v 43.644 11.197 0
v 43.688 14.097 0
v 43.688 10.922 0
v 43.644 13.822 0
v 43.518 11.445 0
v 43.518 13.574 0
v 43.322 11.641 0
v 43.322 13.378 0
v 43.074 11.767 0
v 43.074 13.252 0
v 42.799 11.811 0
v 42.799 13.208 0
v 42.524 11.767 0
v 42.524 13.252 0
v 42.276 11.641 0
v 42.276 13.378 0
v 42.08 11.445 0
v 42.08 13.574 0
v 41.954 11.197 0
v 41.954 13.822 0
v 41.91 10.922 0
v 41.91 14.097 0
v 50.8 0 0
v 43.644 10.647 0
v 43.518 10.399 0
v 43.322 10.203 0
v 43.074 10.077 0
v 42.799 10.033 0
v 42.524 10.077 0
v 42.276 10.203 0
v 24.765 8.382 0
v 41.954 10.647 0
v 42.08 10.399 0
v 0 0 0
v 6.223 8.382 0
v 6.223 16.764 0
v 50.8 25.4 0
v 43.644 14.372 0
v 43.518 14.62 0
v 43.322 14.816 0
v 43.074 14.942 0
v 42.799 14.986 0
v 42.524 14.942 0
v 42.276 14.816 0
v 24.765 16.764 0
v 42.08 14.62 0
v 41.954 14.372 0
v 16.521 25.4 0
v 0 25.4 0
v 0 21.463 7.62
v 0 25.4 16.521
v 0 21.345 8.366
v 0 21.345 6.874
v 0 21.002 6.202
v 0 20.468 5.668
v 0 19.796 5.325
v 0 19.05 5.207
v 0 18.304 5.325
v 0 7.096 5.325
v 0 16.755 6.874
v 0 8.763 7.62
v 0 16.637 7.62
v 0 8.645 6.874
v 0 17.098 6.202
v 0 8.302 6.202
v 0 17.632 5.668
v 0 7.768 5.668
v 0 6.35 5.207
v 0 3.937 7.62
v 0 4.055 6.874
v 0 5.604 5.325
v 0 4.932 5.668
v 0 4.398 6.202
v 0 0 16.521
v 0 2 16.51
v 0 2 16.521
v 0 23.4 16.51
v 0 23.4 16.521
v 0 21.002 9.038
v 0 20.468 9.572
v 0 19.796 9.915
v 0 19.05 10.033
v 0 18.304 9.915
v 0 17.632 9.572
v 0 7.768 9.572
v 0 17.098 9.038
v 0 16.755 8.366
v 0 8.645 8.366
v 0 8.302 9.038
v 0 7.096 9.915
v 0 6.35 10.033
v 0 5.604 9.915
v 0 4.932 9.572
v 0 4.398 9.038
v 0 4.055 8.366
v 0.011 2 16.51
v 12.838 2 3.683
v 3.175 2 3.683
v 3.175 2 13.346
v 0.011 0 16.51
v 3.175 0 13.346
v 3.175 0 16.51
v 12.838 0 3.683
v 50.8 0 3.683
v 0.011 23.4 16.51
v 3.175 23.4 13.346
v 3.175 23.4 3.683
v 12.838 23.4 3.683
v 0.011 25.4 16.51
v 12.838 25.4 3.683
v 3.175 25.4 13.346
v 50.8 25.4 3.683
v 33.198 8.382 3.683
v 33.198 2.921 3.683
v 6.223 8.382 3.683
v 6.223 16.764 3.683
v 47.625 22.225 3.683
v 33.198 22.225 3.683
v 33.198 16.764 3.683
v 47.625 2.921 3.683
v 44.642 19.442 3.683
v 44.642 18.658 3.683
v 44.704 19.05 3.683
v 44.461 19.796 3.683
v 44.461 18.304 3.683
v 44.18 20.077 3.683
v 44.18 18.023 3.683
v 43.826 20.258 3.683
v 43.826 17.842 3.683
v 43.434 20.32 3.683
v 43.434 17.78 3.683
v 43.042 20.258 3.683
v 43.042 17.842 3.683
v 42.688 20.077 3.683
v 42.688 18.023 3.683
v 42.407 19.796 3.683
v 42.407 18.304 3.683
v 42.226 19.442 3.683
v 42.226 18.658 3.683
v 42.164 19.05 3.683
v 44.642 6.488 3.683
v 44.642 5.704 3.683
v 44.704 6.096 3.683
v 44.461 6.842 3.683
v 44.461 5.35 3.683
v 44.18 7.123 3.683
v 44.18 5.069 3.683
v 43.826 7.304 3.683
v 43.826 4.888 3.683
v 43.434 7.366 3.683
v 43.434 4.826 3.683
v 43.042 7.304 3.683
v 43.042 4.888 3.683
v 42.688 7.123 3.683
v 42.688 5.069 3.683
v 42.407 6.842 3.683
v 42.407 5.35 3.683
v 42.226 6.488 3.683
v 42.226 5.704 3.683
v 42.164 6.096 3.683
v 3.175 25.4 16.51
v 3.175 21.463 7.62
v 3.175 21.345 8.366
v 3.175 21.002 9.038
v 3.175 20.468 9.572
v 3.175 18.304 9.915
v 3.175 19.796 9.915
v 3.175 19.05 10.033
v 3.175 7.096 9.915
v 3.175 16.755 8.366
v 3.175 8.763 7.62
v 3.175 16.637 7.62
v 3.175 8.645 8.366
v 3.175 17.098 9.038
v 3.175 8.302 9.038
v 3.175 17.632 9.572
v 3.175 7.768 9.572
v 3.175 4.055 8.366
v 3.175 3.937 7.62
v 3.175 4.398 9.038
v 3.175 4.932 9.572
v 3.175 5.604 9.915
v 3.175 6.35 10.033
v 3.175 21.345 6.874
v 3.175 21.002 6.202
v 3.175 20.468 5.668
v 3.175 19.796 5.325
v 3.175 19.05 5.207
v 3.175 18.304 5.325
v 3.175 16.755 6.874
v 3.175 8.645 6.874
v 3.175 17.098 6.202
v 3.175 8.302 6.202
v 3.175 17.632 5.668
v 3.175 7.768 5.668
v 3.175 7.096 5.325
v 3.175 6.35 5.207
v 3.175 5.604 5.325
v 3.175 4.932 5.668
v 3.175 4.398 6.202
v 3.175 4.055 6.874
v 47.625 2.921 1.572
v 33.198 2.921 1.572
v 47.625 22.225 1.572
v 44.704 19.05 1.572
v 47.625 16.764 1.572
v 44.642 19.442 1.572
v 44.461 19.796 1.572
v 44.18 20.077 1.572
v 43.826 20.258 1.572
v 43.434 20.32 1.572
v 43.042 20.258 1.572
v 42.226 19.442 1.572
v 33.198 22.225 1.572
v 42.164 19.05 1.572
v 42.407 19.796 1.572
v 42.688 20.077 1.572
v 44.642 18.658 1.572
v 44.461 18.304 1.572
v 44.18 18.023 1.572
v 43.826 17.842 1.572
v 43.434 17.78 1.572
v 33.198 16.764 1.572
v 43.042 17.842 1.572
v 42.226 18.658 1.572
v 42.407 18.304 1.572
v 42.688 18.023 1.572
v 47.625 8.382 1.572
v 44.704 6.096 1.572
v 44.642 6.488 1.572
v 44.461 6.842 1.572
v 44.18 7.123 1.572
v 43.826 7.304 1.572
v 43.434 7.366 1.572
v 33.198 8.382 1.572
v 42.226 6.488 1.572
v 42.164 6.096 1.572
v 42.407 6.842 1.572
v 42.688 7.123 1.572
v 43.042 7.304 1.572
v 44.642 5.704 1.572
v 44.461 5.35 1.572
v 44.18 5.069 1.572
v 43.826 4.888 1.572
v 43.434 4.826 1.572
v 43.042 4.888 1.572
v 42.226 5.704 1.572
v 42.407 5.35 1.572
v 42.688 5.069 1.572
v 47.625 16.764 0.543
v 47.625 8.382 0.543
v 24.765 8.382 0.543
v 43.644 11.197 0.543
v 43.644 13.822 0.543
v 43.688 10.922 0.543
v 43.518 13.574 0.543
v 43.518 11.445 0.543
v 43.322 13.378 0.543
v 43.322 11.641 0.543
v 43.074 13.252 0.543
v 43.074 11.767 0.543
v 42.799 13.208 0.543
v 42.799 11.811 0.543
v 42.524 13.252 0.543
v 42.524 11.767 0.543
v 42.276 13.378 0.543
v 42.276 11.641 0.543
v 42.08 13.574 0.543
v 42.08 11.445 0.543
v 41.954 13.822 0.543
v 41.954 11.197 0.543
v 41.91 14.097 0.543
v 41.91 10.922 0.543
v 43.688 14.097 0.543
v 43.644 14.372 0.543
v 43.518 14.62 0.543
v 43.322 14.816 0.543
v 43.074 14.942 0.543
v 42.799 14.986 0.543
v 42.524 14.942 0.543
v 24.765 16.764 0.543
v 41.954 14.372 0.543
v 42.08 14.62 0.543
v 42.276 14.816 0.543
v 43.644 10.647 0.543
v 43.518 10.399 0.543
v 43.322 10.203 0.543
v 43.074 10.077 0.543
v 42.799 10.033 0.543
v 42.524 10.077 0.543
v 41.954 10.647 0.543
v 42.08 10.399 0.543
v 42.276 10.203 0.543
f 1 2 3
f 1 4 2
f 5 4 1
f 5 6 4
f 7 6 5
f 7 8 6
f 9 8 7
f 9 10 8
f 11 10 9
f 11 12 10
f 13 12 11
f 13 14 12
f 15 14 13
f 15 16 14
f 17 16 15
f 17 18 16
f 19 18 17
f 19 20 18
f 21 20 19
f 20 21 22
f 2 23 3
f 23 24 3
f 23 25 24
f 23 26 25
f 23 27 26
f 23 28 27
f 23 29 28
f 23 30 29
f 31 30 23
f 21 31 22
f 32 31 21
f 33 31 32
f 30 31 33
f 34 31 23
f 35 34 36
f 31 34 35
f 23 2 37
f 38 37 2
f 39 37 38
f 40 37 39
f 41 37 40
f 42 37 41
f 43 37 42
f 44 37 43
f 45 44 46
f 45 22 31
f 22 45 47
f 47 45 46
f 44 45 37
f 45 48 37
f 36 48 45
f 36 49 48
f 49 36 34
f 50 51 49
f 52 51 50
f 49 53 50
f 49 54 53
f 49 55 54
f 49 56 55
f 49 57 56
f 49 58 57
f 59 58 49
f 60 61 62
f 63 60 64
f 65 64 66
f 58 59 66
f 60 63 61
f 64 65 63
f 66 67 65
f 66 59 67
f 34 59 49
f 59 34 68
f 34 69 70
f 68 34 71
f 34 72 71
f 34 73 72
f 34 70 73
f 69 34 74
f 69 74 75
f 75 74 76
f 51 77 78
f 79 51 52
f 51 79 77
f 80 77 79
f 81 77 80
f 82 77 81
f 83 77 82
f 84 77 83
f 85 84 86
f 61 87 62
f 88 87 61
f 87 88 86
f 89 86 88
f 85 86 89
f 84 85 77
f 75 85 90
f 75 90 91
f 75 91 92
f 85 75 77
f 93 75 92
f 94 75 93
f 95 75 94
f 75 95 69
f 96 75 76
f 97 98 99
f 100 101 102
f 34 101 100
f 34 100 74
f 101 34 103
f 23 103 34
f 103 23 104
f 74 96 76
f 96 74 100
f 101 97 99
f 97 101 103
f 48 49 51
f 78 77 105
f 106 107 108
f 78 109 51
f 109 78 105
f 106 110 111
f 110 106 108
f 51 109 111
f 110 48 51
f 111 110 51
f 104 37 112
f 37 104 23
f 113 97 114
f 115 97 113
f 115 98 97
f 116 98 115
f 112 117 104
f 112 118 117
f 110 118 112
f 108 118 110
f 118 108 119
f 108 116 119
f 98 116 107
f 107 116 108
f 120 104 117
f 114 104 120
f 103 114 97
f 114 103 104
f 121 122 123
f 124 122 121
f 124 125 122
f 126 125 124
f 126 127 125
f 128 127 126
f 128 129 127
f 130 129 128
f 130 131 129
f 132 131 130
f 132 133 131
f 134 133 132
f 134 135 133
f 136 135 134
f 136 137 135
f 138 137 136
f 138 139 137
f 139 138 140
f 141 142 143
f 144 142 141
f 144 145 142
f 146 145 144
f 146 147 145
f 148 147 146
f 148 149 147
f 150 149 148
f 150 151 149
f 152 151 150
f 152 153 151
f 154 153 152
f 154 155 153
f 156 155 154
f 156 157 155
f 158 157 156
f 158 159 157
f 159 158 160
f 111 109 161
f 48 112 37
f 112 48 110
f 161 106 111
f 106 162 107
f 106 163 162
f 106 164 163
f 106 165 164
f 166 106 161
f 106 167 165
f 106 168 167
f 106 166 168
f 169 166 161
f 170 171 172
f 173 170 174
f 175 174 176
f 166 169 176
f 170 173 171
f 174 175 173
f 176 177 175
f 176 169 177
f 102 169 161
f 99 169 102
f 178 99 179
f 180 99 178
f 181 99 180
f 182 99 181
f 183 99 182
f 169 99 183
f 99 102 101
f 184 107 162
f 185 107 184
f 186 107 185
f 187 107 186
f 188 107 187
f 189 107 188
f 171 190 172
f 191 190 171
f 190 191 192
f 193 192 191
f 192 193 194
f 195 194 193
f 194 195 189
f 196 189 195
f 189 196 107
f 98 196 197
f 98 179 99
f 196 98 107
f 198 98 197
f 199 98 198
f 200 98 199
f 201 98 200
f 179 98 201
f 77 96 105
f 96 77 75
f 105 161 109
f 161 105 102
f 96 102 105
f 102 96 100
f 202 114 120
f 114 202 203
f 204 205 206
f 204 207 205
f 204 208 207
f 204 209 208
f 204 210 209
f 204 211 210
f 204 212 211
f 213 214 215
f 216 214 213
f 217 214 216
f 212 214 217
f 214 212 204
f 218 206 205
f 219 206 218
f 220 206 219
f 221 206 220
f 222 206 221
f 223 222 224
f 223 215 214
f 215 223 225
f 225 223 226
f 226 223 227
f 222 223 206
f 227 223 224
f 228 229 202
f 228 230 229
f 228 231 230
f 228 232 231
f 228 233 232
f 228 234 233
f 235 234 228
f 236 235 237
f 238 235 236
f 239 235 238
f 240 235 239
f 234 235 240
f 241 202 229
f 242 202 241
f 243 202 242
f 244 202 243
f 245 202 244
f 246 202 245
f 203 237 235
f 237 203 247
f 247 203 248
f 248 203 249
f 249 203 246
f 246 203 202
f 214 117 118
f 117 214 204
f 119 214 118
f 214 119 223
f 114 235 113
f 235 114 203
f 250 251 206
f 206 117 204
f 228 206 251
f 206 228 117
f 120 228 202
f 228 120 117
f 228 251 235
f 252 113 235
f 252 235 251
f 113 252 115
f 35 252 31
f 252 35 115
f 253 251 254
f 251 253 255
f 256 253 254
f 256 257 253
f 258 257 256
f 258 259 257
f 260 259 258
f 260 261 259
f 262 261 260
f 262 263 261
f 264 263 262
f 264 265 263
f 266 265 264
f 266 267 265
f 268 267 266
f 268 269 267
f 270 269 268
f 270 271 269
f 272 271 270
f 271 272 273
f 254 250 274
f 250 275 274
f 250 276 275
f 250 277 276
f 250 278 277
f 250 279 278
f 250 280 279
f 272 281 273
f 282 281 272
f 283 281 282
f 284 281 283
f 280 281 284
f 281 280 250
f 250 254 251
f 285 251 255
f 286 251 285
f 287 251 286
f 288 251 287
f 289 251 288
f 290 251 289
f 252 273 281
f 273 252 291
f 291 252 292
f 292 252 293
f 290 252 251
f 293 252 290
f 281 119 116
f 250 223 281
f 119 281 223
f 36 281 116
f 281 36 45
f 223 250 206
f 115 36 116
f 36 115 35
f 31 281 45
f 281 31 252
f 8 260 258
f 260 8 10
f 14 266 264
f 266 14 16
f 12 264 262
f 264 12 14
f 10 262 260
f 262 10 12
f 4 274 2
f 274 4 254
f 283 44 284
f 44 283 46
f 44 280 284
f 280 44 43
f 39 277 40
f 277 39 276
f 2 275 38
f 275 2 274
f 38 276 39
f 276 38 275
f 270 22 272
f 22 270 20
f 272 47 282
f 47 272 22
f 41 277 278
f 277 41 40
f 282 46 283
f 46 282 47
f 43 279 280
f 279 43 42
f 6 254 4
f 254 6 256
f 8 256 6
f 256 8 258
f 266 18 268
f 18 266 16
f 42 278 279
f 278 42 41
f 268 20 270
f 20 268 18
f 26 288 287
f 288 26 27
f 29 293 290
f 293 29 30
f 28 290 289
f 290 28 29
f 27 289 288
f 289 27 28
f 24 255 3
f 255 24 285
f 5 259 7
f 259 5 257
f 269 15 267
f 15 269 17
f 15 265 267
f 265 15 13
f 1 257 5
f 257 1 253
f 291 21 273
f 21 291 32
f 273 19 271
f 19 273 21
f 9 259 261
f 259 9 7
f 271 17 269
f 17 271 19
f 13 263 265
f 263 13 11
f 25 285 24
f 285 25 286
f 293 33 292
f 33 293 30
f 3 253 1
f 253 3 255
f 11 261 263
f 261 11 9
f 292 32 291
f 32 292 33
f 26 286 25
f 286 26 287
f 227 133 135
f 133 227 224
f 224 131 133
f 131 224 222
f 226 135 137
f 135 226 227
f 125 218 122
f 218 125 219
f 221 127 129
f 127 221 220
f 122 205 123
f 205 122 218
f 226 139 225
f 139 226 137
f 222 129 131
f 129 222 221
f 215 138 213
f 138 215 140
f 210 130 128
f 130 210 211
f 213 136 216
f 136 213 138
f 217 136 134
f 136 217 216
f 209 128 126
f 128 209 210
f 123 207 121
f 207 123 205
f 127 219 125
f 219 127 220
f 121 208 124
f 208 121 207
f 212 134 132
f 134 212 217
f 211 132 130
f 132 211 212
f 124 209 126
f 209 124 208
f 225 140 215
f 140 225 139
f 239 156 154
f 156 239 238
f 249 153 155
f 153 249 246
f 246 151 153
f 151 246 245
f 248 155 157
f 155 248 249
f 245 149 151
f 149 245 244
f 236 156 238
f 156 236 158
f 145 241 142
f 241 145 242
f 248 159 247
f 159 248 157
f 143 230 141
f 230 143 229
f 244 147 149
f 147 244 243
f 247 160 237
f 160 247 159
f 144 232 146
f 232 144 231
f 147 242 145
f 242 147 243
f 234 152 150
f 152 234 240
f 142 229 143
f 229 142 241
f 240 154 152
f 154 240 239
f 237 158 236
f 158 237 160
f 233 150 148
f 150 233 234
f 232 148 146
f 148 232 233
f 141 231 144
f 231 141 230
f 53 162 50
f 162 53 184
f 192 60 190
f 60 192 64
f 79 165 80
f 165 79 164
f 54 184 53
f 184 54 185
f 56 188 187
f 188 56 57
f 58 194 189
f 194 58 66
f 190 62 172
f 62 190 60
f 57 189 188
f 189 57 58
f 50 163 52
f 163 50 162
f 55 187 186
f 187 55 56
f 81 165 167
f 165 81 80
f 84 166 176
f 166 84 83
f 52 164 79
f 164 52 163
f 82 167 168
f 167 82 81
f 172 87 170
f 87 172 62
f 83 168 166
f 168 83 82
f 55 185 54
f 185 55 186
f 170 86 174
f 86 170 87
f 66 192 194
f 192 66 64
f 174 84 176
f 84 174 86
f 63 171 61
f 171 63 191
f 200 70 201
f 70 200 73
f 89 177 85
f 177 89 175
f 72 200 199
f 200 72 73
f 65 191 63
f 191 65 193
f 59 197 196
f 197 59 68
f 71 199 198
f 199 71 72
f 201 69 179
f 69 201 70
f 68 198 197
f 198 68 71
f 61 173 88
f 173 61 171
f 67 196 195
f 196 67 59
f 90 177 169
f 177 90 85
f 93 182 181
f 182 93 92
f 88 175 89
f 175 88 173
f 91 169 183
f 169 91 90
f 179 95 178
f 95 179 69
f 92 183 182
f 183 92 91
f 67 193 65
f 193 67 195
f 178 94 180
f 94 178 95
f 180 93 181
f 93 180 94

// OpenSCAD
width=inch(1);
thickness=inch(0.125);

extra_thick=inch(0.020);
//extra_thick=inch(0);
length=inch(2);
diagthick=2;

holedia = inch(0.190);

function inch(a) = a*25.4;

module mytriangle()
{
    intersection() {
	cube([width, diagthick, width]);
	translate([-width+6, 0, 0]) {
	    rotate([0, 45, 0]) {
		cube([width, diagthick, width]);
	    }
	}    
    }
}

module bracket() {
    union(){
	cube([inch(2),   inch(1), thickness+extra_thick  ]);   // bottom - where sensor goes

/*	translate([inch(1.2), 0, 0]) {    // extra around sensor
	    cube([inch(0.8), inch(1), thickness+extra_thick]);
	}
*/
	
	cube([thickness, inch(1), inch(0.65)]);	// vertical mounting tail
    
        mytriangle();
	translate([0, width-diagthick, 0]) {
	    mytriangle();
	}

    }
}

// positive model of wcp hall-effect sensor
module wcp971() {

    difference() {
	union(){
	    cube([inch(.760), inch(.568), inch(.0635)+extra_thick]);
	    translate([ inch((.760-.330)/2), 0, 0]) {
		cube([ inch(.330), inch(1.500), inch(.104)+extra_thick]);
	    }
	    translate([ inch((.760-.330)/2), inch(0.9), 0]) {
		cube([ inch(.330), inch(0.730), inch(.2)]);
	    }
	    
	    translate([inch((.760-.12)/2 ), inch(.190), -1]) {
		cylinder(h=8, d=inch(.07),  $fn=20);
	    }
	    translate([inch(.760-(.750-.12)/2 ), inch(.190), -1]) {
		cylinder(h=8, d=inch(.07),  $fn=20);
	    }
	    
	}

	translate([inch((.760-.510)/2 ), inch(.165), -1]) {
	    cylinder(h=8,d=inch(.100),  $fn=20);
	}

	translate([inch(.760 - (.760-.510)/2 ), inch(.165), -1]) {
	    cylinder(h=8,d=inch(.100),  $fn=20);
	}
    }
}

// put it all together
union(){
    difference () {
	bracket();

	translate([inch(1.875),inch(.875), thickness+0.010+extra_thick]) {
	    rotate([0,180,90]) {
		wcp971();
	    }
	}

	// bottom-side holes 
/*
	translate([15,20,0]) {
		cylinder(h=6,d=6);
	}
*/

// holes in vertical tail for mounting
	translate([-1, inch(0.75),inch(0.3) ]) {
	    rotate([0,90,0]) {
		cylinder(h=8,d=holedia,  $fn=20);
	    }
        }
	translate([-1, inch(0.25), inch(0.3) ]) {
	    rotate([0,90,0]) {
		cylinder(h=8,d=holedia, $fn=20);
	    }
        }

	translate([-1, inch(0.75),inch(0.8) ]) {
	    rotate([0,90,0]) {
		cylinder(h=8,d=holedia,  $fn=20);
	    }
        }
	translate([-1, inch(0.25), inch(0.8) ]) {
	    rotate([0,90,0]) {
		cylinder(h=8,d=holedia,  $fn=20);
	    }
        }
    }
}
